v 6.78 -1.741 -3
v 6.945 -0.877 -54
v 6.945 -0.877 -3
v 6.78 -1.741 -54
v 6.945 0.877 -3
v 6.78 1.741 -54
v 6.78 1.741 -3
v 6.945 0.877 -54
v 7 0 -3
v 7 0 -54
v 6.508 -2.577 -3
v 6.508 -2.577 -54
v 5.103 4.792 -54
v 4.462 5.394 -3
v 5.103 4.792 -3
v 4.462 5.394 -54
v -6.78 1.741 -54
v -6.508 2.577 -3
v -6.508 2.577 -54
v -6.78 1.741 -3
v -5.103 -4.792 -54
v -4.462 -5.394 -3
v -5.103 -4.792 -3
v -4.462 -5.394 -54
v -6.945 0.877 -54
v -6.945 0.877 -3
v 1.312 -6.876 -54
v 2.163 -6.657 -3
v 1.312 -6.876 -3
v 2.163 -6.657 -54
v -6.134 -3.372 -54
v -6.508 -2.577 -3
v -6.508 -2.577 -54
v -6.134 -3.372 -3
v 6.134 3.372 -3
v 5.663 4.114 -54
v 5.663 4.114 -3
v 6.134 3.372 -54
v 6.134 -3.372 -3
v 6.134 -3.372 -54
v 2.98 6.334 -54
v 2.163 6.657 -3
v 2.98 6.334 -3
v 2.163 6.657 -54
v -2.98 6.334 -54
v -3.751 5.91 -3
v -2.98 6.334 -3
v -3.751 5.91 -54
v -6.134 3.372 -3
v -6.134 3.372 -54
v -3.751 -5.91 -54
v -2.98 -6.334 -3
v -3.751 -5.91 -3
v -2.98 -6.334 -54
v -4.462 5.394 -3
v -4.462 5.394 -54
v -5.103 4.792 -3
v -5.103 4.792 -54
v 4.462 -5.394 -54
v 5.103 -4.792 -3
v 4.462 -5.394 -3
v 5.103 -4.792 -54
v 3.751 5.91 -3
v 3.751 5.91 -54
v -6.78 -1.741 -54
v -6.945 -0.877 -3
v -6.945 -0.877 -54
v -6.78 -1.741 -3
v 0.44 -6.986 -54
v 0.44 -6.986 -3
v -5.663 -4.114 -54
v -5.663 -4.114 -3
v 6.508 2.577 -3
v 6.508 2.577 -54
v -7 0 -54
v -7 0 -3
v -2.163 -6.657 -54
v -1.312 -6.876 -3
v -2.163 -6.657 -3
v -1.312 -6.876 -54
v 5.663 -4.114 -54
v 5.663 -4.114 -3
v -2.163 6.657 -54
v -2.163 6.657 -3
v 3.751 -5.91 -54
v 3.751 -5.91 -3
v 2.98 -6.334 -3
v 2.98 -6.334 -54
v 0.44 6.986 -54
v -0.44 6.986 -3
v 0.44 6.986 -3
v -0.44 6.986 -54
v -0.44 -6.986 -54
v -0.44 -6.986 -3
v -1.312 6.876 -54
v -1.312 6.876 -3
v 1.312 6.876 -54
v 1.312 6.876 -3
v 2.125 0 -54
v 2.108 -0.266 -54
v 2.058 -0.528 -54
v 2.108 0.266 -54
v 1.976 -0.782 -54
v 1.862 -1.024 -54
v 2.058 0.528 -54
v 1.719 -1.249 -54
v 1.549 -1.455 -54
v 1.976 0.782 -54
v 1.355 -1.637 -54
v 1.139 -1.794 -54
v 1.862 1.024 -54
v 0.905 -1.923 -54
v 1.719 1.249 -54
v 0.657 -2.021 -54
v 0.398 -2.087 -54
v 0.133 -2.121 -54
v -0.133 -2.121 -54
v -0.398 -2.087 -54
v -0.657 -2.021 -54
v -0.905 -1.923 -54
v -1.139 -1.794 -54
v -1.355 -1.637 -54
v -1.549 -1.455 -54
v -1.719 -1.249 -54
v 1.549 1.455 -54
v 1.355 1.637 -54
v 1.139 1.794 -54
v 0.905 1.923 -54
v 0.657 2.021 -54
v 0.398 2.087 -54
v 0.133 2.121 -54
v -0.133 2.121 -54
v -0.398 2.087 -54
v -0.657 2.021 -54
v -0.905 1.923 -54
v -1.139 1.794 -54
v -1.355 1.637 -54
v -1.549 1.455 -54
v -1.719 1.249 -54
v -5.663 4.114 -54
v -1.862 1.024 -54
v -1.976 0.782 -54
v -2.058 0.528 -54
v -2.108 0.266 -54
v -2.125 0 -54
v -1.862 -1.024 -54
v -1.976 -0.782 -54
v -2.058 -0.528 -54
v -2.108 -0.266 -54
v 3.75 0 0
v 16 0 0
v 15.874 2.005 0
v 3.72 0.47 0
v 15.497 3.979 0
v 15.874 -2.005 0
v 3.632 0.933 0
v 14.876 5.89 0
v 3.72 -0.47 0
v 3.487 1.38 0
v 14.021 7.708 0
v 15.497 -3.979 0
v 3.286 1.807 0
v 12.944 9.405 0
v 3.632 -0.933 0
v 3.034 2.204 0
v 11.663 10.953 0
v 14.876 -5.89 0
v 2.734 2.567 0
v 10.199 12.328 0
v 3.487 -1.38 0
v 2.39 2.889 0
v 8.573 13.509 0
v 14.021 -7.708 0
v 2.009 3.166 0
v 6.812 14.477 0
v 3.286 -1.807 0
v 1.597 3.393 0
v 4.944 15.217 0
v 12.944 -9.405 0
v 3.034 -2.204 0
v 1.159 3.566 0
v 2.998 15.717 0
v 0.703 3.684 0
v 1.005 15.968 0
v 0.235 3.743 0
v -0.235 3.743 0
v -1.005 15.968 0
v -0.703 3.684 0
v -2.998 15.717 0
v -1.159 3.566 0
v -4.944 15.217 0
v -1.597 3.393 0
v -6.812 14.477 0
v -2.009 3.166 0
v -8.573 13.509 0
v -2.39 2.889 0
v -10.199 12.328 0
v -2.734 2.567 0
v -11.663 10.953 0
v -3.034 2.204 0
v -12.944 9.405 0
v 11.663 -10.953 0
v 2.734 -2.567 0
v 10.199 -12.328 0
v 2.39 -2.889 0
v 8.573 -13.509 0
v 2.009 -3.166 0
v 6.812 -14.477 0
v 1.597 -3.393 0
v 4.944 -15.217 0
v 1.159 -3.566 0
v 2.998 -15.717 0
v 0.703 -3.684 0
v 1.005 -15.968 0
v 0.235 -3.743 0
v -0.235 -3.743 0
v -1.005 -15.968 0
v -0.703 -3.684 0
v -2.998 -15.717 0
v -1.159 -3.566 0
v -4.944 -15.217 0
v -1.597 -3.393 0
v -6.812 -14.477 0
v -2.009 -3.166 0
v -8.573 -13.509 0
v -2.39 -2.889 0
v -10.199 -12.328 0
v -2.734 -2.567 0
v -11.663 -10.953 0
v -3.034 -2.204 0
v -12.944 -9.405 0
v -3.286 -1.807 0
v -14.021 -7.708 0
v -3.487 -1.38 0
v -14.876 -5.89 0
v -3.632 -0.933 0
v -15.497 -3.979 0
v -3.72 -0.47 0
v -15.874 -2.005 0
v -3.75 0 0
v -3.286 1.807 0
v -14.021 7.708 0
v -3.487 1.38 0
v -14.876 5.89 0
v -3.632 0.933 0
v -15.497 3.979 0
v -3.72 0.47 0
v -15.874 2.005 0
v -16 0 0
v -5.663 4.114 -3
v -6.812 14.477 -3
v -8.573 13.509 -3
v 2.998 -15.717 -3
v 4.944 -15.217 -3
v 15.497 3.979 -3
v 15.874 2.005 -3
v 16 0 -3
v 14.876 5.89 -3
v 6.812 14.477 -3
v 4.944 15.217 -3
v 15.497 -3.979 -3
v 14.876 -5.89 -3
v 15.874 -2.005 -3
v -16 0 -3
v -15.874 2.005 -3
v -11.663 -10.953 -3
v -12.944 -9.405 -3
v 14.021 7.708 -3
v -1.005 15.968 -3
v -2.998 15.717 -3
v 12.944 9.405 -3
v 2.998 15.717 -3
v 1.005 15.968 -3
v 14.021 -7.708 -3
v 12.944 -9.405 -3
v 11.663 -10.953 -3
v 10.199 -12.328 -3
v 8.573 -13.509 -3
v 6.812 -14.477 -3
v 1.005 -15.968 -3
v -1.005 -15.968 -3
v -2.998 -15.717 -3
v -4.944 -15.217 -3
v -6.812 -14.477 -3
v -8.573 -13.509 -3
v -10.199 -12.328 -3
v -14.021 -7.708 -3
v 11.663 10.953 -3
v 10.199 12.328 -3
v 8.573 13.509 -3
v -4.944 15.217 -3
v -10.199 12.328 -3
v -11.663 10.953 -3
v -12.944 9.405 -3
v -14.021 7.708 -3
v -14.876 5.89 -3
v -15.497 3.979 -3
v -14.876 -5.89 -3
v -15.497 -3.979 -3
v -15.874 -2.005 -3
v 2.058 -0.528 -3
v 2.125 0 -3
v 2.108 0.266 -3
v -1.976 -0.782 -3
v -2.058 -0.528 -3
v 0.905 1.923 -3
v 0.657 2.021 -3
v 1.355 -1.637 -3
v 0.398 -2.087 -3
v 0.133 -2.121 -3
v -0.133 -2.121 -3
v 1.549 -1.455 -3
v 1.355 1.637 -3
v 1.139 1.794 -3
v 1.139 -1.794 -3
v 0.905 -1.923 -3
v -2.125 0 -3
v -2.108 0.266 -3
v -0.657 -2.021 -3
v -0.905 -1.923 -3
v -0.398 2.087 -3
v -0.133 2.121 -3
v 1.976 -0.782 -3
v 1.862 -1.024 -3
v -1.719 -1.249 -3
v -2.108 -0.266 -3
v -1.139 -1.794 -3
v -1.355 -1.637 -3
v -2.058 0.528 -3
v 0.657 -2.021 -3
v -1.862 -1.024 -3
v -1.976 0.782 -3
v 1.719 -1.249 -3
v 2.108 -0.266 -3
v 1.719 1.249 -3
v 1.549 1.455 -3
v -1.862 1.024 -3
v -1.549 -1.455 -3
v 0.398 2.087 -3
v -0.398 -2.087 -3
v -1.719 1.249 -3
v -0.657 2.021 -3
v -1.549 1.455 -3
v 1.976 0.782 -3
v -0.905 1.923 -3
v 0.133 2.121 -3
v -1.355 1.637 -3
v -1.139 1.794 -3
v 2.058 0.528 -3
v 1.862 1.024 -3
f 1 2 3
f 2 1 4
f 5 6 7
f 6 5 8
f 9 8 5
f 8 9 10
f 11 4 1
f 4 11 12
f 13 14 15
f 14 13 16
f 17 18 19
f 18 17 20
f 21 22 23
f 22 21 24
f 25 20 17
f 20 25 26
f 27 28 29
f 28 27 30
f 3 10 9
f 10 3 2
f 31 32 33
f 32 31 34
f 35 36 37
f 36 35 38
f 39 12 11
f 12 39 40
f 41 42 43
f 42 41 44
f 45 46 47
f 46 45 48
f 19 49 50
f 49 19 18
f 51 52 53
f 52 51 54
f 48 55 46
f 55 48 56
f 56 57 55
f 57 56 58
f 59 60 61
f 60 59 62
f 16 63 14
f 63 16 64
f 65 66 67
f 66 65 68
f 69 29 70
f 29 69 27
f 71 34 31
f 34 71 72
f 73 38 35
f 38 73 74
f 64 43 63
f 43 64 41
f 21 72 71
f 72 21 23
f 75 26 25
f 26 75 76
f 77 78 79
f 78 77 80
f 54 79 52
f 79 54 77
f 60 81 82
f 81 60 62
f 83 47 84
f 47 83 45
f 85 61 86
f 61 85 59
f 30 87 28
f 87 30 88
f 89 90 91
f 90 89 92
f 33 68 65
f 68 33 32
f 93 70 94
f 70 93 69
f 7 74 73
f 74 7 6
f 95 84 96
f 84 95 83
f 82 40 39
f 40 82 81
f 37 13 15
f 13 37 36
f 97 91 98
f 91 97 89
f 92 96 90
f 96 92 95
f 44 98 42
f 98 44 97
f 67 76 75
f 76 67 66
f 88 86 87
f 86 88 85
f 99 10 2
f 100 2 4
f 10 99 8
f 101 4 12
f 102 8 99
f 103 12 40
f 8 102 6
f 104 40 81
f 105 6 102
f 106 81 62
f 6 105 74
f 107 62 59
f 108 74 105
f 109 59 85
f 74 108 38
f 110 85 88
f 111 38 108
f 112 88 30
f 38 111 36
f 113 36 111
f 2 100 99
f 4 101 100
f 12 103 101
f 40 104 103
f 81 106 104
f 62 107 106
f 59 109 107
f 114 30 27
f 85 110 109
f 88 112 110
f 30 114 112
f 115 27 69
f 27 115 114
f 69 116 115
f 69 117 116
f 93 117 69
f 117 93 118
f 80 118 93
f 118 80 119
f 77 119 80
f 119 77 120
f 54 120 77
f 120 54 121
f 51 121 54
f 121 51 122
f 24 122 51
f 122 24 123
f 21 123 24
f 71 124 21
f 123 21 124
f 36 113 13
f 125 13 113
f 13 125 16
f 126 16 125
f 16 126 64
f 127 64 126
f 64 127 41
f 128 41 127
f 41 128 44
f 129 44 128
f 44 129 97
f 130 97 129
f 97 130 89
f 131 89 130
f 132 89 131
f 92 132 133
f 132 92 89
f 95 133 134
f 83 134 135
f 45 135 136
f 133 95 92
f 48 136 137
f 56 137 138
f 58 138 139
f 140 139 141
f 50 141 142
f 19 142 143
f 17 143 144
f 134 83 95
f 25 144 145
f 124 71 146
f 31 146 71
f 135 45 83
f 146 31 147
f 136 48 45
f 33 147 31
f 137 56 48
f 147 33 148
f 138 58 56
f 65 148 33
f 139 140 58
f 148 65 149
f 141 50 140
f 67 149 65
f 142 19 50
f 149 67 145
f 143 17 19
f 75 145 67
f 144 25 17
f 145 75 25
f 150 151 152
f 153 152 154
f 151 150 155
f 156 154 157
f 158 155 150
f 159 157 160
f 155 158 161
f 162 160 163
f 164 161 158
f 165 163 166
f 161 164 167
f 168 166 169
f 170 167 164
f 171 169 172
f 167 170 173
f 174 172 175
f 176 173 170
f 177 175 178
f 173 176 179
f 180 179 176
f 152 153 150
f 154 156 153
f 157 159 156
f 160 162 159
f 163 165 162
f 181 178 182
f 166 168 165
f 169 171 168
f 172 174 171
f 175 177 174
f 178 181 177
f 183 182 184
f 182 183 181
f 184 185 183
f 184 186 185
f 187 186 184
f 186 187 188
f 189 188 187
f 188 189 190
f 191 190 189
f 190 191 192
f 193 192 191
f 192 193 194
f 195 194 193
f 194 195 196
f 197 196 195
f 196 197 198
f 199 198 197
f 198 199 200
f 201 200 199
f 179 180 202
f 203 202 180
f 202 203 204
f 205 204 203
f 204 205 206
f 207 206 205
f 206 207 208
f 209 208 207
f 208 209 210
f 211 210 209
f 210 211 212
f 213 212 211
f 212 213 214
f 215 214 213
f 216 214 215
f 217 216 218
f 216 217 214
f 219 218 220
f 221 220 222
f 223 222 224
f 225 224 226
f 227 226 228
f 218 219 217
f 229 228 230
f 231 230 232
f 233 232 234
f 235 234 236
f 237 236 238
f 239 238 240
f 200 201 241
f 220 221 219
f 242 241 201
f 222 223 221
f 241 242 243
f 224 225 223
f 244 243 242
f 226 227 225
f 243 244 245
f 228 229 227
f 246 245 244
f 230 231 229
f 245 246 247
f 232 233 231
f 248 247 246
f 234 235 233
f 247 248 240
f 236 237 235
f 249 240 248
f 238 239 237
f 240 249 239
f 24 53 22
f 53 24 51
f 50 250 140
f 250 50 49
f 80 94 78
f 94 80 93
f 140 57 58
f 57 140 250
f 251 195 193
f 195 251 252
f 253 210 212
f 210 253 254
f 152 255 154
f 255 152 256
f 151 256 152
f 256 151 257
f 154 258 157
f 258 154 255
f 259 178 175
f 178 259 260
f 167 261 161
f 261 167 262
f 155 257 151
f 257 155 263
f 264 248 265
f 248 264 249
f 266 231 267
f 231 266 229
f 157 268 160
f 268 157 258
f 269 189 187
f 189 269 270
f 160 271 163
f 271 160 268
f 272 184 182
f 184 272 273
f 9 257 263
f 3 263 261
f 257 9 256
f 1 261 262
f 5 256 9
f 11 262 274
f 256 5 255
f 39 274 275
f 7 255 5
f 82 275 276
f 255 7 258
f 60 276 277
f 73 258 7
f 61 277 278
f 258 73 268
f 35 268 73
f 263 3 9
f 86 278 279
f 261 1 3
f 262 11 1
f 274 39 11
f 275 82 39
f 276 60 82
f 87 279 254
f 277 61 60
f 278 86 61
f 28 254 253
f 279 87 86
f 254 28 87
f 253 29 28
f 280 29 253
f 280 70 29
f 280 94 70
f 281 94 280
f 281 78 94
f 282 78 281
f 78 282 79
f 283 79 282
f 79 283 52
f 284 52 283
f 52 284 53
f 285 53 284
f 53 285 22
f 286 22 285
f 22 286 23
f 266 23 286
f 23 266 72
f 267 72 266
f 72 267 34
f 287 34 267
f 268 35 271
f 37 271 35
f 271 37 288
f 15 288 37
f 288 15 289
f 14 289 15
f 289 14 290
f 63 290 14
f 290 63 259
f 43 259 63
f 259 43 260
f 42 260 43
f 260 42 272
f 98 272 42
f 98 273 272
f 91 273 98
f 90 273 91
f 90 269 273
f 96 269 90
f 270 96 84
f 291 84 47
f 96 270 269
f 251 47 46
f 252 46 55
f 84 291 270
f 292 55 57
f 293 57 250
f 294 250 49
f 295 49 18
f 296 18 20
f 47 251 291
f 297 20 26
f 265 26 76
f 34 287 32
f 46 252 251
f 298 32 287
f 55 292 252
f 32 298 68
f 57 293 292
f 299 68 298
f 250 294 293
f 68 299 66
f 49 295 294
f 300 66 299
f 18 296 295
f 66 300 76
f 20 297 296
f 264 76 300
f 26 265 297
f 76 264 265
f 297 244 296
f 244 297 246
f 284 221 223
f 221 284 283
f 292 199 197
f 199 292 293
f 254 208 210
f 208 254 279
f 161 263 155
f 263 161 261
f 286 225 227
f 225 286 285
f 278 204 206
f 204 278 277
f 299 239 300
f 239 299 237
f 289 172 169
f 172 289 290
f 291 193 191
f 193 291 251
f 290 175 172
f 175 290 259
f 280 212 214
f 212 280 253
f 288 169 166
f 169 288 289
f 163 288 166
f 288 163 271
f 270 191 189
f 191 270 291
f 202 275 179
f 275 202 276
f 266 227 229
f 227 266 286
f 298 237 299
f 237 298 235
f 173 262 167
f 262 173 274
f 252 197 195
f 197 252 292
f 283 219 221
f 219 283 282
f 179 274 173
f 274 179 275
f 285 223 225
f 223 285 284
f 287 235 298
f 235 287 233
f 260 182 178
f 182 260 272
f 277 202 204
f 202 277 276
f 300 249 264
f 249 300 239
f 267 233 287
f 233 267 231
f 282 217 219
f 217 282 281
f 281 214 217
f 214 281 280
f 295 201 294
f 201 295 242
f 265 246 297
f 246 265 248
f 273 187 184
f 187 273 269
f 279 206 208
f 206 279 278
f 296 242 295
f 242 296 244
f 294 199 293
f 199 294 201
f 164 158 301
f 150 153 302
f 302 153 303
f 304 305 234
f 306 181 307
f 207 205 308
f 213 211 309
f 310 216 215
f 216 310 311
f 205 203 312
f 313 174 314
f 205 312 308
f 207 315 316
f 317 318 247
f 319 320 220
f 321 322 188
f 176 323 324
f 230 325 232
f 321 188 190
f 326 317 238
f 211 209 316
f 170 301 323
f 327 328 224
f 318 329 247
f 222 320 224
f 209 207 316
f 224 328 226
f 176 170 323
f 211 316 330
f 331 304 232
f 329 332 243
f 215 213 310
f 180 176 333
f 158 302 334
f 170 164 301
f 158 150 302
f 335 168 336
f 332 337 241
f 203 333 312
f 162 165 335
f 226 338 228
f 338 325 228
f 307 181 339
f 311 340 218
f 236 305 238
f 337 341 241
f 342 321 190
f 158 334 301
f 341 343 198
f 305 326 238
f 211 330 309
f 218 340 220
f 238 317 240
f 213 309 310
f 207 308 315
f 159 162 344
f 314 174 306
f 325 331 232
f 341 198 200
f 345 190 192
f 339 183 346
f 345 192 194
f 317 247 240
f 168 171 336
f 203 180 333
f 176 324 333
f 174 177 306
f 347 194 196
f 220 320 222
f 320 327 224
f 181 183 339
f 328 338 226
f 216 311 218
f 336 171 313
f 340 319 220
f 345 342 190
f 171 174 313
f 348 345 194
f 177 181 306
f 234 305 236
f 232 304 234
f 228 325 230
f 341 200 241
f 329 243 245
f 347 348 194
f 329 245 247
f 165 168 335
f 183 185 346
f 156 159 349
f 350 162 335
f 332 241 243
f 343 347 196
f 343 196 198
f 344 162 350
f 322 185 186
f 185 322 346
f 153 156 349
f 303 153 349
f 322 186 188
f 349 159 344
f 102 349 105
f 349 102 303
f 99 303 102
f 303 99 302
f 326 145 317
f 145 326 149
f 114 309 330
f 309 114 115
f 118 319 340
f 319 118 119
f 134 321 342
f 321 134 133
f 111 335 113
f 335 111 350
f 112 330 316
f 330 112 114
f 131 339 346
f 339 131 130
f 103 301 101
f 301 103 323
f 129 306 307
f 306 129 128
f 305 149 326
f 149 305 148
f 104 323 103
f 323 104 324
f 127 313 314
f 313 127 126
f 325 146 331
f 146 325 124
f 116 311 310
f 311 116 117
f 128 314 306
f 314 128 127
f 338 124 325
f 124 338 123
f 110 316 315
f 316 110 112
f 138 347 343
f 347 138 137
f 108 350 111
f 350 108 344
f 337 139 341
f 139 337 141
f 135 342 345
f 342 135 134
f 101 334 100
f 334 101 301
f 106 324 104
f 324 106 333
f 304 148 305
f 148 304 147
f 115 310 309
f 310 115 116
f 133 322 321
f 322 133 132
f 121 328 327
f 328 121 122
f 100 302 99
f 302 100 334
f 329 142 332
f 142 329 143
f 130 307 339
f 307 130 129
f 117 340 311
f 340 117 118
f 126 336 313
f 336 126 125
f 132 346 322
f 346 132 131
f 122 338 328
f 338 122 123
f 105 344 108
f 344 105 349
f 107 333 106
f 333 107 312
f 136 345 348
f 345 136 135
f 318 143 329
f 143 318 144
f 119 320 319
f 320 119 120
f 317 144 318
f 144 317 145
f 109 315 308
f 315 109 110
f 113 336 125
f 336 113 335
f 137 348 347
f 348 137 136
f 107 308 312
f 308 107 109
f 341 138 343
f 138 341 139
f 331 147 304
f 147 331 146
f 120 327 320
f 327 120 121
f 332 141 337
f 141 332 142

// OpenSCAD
$fn = 50;


difference() {
	union() {
		translate(v = [0, 0, -54.0000000000]) {
			cylinder(h = 54, r = 7.0000000000);
		}
		translate(v = [0, 0, -3.0000000000]) {
			cylinder(h = 3, r = 16.0000000000);
		}
	}
	union() {
		translate(v = [0, 0, 0]) {
			rotate(a = [0, 0, 0]) {
				difference() {
					union() {
						#translate(v = [0, 0, -54.0000000000]) {
							cylinder(h = 54, r = 2.0000000000);
						}
						#translate(v = [0, 0, -3]) {
							cylinder(h = 3, r1 = 2.1250000000, r2 = 3.7500000000);
						}
						#translate(v = [0, 0, -54.0000000000]) {
							cylinder(h = 54, r = 2.1250000000);
						}
						#translate(v = [0, 0, -54.0000000000]) {
							cylinder(h = 54, r = 2.0000000000);
						}
					}
					union();
				}
			}
		}
	}
}
